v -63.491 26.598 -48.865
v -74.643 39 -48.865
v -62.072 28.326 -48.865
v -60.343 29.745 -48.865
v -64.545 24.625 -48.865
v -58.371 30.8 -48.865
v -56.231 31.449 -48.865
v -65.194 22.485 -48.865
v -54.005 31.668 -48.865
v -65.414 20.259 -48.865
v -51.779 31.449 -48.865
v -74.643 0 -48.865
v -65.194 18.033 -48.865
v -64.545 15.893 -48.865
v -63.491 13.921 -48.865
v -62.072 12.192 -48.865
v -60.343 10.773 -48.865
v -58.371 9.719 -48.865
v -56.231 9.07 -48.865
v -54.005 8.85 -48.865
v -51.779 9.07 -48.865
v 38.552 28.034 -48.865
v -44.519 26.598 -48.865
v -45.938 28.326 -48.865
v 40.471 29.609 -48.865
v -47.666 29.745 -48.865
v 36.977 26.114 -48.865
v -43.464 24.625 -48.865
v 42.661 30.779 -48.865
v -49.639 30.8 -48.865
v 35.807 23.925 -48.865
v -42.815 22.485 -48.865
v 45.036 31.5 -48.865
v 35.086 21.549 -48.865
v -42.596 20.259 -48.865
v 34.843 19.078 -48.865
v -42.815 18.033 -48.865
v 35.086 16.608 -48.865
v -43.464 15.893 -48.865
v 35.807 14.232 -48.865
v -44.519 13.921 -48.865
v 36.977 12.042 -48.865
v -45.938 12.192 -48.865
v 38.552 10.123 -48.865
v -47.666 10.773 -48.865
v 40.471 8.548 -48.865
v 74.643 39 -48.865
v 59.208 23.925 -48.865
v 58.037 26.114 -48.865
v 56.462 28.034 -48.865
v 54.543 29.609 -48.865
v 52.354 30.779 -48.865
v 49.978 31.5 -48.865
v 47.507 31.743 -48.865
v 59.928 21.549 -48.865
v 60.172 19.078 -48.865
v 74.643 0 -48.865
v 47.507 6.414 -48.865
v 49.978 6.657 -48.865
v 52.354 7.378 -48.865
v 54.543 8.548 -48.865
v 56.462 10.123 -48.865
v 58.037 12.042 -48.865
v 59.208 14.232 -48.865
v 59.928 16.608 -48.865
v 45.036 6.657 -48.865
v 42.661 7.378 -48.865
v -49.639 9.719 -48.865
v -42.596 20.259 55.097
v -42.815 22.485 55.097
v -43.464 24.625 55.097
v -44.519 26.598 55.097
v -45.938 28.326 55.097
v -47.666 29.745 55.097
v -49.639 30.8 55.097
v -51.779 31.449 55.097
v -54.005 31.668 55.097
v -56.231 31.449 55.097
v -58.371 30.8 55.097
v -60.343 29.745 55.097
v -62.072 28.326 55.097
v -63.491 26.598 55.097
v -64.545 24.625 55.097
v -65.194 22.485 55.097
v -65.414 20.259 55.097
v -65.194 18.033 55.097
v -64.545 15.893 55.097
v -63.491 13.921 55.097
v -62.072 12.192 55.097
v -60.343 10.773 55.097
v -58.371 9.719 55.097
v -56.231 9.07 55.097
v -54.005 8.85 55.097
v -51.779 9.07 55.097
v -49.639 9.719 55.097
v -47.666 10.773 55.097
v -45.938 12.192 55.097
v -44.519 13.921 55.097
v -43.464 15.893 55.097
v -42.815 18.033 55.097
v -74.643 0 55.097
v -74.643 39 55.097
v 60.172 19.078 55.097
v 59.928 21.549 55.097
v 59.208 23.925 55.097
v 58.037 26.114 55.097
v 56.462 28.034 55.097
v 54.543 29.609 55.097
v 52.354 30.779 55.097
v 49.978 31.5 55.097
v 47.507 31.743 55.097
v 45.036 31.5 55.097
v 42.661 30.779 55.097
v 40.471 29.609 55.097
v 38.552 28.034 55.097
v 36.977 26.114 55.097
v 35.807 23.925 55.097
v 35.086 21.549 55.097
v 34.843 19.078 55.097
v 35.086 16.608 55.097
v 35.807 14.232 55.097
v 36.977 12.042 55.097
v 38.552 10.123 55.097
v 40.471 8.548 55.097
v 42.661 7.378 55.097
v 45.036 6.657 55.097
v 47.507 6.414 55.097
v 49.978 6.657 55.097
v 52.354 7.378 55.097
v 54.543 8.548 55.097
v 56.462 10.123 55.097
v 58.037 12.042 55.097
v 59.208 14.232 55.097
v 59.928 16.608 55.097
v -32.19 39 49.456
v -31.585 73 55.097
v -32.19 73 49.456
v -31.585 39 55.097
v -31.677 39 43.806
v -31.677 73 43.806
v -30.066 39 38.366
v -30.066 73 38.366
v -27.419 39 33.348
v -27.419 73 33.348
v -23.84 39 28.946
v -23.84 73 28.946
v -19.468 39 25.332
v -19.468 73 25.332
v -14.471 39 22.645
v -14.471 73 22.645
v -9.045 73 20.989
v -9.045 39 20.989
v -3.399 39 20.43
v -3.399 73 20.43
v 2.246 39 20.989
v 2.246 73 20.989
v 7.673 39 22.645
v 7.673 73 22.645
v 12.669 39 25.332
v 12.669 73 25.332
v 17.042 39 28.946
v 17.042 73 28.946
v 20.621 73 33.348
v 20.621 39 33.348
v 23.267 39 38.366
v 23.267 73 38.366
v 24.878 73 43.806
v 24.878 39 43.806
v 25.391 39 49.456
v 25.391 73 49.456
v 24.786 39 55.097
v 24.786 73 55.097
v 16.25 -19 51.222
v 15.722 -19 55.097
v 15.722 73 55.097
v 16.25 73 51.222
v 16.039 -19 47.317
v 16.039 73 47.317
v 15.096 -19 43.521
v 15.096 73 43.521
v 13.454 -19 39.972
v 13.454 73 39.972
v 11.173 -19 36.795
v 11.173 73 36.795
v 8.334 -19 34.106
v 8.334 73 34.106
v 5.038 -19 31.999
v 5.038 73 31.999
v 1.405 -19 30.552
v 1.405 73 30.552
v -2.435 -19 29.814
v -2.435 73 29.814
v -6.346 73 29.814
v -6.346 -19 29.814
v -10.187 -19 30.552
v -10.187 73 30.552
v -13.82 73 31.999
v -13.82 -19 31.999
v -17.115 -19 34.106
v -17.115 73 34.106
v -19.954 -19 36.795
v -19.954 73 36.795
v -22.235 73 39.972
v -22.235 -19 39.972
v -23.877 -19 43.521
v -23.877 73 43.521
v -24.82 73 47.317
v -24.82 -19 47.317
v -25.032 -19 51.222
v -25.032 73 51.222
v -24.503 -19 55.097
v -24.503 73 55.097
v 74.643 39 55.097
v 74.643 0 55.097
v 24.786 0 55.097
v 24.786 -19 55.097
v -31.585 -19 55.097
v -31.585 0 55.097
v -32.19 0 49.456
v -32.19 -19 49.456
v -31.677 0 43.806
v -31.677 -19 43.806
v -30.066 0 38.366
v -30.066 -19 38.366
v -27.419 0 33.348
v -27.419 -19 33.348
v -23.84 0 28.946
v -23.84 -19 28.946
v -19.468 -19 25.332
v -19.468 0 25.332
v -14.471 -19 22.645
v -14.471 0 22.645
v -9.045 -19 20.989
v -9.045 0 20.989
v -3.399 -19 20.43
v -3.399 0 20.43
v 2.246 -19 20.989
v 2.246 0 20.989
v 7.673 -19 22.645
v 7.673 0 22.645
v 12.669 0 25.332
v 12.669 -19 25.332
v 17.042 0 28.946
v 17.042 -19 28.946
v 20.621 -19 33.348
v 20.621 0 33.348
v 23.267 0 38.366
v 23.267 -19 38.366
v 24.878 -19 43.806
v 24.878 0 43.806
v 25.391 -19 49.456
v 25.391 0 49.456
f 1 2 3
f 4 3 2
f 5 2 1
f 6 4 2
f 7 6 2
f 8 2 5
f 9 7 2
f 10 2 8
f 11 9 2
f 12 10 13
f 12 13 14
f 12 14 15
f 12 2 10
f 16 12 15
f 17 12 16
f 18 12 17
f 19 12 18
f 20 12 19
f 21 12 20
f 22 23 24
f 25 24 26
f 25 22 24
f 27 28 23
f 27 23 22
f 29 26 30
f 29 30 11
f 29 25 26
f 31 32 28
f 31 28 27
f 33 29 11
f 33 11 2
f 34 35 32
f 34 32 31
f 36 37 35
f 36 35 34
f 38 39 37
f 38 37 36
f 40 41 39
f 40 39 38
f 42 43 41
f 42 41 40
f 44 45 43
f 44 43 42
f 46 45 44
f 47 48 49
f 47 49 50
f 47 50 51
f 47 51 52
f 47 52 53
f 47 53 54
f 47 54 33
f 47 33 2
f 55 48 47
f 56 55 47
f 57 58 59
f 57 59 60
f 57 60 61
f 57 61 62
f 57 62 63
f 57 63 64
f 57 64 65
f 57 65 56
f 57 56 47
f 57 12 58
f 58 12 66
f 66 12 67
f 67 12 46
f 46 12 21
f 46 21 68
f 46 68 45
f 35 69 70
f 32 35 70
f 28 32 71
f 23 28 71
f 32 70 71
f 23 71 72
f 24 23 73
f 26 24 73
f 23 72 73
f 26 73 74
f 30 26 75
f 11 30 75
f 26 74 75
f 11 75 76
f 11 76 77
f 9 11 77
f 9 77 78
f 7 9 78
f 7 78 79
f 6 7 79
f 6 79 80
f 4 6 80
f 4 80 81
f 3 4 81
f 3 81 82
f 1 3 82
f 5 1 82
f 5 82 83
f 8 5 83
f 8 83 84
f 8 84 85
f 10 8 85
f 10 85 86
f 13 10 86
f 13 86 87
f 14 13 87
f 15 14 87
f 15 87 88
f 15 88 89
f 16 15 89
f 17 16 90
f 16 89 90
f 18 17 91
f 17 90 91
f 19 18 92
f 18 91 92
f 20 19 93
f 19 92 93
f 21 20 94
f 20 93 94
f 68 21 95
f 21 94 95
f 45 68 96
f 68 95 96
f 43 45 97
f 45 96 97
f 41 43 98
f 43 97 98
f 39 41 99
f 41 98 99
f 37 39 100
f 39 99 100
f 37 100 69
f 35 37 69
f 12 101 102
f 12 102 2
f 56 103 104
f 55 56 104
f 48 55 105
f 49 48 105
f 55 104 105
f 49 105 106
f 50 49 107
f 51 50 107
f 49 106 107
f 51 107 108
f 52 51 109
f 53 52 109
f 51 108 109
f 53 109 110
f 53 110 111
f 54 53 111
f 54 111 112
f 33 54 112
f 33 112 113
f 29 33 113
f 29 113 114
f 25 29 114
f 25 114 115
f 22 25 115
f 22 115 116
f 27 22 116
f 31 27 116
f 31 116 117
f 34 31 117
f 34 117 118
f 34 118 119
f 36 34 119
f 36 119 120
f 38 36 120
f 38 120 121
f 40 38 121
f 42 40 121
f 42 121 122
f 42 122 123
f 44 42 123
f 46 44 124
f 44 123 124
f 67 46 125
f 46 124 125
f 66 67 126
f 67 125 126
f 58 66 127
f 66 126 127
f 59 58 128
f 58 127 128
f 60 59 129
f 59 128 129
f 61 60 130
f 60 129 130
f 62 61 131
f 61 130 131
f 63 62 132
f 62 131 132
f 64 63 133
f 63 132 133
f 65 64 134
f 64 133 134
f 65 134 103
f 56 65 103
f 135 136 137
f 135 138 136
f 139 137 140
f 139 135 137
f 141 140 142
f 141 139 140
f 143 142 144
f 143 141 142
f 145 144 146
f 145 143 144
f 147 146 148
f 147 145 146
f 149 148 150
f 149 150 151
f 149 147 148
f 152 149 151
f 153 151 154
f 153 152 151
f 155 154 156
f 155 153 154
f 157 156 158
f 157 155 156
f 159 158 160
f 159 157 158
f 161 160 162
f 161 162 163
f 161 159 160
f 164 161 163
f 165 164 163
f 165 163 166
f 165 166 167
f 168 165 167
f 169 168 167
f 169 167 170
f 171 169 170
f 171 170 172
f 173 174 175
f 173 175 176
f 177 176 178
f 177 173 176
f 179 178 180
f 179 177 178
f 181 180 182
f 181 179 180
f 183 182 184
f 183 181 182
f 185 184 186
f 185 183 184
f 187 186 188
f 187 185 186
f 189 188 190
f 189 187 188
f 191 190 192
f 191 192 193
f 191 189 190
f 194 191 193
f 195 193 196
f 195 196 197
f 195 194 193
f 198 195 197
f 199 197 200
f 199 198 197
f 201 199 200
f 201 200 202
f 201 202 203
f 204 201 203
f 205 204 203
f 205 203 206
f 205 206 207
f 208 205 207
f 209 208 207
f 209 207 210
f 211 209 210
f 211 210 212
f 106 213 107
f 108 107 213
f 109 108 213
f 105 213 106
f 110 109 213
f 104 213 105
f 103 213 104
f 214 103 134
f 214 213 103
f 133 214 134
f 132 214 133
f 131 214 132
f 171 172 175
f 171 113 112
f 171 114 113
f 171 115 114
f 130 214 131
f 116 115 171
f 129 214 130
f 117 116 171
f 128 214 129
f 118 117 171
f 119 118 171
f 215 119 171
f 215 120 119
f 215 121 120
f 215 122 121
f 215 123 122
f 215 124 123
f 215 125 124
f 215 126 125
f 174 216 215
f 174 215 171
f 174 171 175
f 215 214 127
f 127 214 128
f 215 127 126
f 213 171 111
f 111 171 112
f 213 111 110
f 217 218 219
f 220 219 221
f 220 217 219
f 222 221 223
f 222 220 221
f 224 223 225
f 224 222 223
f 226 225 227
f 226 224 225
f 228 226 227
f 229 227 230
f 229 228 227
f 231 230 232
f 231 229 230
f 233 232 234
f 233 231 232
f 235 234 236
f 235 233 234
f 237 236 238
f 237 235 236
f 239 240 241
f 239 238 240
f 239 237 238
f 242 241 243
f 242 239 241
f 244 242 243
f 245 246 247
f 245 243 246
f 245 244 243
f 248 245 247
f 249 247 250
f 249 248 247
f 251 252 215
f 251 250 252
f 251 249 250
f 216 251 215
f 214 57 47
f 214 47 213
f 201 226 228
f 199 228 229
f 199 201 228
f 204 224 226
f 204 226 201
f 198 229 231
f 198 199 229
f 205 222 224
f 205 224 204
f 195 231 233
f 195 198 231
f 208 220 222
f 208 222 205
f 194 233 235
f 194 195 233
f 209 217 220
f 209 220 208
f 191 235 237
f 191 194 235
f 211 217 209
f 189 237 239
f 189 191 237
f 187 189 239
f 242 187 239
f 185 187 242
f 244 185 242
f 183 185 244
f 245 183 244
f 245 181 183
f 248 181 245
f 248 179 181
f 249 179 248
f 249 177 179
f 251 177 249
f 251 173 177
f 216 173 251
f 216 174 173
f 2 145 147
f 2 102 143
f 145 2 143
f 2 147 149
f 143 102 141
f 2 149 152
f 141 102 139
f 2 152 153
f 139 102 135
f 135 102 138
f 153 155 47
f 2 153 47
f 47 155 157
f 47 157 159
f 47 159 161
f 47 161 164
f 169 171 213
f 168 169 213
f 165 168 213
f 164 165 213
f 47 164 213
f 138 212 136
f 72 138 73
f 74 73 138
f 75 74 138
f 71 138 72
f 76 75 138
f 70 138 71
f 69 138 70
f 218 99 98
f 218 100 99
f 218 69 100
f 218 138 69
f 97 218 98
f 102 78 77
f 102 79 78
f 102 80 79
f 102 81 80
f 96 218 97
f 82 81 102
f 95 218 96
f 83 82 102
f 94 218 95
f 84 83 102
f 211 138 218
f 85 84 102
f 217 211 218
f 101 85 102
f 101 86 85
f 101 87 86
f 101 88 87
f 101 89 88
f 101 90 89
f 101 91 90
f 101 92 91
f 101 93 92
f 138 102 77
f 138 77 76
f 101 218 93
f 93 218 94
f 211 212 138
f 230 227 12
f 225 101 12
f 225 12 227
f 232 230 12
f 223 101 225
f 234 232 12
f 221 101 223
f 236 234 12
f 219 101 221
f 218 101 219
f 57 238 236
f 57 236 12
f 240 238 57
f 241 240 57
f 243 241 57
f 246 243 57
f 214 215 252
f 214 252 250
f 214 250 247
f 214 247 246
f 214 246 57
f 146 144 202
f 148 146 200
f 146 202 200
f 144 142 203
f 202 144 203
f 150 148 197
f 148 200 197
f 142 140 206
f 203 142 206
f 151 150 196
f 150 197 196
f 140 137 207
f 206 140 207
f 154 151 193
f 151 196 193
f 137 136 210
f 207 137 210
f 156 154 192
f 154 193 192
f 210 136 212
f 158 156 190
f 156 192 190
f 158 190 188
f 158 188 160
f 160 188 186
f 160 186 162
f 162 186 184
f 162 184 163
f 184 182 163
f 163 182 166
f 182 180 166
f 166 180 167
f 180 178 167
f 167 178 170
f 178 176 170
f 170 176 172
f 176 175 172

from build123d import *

# Parameters (mm, degrees)
F1_DEPTH = 19
F2_DEPTH = 92
F3_DEPTH = 39
F4_R     = 11.4088376228
F6_DEPTH = 103.9623373578
F5_R     = 12.6645604818
F7_DEPTH = 103.9623373578


with BuildPart() as f1:
    # F0 (on Front) → F1 (new body)
    with BuildSketch(Plane.XZ):
        with BuildLine():
            Line((-24.5031490922, 55.0966747105), (-31.5849818289, 55.0966747105))
            ThreePointArc((-31.5849818289, 55.0966747105), (-3.3992808312, 20.4304908119), (24.7864201665, 55.0966747105))
            Line((24.7864201665, 55.0966747105), (15.7216750085, 55.0966747105))
            ThreePointArc((15.7216750085, 55.0966747105), (-4.3907370418, 29.7217311132), (-24.5031490922, 55.0966747105))
        make_face()
    extrude(amount=F1_DEPTH)

    # F2 (add): a face of the model
    f2_faces = [f1.faces().sort_by_distance(p)[0] for p in [
        (20.2540475875, -19, 54.4245489648),
    ]]
    extrude(f2_faces, amount=-F2_DEPTH)

    # F0 (on Front) → F3 (join)
    with BuildSketch(Plane.XZ):
        with BuildLine():
            Line((-31.5849818289, 55.0966747105), (-74.6425390244, 55.0966747105))
            Line((-74.6425390244, 55.0966747105), (-74.6425390244, -48.8646626472))
            Line((-74.6425390244, -48.8646626472), (74.6425390244, -48.8646626472))
            Line((74.6425390244, -48.8646626472), (74.6425390244, 55.0966747105))
            Line((74.6425390244, 55.0966747105), (24.7864201665, 55.0966747105))
            ThreePointArc((24.7864201665, 55.0966747105), (-3.3992808312, 20.4304908119), (-31.5849818289, 55.0966747105))
        make_face()
    extrude(amount=-F3_DEPTH)

    # F4 (on face) → F6 (cut, through all)
    with BuildSketch(Plane.XY.offset(55.0966747105)):
        with Locations((-54.0047772229, 20.259199664)):
            Circle(F4_R)
    extrude(amount=-F6_DEPTH, mode=Mode.SUBTRACT)

    # F5 (on face) → F7 (cut, through all)
    with BuildSketch(Plane.XY.offset(55.0966747105)):
        with Locations((47.5070998073, 19.0783925354)):
            Circle(F5_R)
    extrude(amount=-F7_DEPTH, mode=Mode.SUBTRACT)


solid = f1.part
